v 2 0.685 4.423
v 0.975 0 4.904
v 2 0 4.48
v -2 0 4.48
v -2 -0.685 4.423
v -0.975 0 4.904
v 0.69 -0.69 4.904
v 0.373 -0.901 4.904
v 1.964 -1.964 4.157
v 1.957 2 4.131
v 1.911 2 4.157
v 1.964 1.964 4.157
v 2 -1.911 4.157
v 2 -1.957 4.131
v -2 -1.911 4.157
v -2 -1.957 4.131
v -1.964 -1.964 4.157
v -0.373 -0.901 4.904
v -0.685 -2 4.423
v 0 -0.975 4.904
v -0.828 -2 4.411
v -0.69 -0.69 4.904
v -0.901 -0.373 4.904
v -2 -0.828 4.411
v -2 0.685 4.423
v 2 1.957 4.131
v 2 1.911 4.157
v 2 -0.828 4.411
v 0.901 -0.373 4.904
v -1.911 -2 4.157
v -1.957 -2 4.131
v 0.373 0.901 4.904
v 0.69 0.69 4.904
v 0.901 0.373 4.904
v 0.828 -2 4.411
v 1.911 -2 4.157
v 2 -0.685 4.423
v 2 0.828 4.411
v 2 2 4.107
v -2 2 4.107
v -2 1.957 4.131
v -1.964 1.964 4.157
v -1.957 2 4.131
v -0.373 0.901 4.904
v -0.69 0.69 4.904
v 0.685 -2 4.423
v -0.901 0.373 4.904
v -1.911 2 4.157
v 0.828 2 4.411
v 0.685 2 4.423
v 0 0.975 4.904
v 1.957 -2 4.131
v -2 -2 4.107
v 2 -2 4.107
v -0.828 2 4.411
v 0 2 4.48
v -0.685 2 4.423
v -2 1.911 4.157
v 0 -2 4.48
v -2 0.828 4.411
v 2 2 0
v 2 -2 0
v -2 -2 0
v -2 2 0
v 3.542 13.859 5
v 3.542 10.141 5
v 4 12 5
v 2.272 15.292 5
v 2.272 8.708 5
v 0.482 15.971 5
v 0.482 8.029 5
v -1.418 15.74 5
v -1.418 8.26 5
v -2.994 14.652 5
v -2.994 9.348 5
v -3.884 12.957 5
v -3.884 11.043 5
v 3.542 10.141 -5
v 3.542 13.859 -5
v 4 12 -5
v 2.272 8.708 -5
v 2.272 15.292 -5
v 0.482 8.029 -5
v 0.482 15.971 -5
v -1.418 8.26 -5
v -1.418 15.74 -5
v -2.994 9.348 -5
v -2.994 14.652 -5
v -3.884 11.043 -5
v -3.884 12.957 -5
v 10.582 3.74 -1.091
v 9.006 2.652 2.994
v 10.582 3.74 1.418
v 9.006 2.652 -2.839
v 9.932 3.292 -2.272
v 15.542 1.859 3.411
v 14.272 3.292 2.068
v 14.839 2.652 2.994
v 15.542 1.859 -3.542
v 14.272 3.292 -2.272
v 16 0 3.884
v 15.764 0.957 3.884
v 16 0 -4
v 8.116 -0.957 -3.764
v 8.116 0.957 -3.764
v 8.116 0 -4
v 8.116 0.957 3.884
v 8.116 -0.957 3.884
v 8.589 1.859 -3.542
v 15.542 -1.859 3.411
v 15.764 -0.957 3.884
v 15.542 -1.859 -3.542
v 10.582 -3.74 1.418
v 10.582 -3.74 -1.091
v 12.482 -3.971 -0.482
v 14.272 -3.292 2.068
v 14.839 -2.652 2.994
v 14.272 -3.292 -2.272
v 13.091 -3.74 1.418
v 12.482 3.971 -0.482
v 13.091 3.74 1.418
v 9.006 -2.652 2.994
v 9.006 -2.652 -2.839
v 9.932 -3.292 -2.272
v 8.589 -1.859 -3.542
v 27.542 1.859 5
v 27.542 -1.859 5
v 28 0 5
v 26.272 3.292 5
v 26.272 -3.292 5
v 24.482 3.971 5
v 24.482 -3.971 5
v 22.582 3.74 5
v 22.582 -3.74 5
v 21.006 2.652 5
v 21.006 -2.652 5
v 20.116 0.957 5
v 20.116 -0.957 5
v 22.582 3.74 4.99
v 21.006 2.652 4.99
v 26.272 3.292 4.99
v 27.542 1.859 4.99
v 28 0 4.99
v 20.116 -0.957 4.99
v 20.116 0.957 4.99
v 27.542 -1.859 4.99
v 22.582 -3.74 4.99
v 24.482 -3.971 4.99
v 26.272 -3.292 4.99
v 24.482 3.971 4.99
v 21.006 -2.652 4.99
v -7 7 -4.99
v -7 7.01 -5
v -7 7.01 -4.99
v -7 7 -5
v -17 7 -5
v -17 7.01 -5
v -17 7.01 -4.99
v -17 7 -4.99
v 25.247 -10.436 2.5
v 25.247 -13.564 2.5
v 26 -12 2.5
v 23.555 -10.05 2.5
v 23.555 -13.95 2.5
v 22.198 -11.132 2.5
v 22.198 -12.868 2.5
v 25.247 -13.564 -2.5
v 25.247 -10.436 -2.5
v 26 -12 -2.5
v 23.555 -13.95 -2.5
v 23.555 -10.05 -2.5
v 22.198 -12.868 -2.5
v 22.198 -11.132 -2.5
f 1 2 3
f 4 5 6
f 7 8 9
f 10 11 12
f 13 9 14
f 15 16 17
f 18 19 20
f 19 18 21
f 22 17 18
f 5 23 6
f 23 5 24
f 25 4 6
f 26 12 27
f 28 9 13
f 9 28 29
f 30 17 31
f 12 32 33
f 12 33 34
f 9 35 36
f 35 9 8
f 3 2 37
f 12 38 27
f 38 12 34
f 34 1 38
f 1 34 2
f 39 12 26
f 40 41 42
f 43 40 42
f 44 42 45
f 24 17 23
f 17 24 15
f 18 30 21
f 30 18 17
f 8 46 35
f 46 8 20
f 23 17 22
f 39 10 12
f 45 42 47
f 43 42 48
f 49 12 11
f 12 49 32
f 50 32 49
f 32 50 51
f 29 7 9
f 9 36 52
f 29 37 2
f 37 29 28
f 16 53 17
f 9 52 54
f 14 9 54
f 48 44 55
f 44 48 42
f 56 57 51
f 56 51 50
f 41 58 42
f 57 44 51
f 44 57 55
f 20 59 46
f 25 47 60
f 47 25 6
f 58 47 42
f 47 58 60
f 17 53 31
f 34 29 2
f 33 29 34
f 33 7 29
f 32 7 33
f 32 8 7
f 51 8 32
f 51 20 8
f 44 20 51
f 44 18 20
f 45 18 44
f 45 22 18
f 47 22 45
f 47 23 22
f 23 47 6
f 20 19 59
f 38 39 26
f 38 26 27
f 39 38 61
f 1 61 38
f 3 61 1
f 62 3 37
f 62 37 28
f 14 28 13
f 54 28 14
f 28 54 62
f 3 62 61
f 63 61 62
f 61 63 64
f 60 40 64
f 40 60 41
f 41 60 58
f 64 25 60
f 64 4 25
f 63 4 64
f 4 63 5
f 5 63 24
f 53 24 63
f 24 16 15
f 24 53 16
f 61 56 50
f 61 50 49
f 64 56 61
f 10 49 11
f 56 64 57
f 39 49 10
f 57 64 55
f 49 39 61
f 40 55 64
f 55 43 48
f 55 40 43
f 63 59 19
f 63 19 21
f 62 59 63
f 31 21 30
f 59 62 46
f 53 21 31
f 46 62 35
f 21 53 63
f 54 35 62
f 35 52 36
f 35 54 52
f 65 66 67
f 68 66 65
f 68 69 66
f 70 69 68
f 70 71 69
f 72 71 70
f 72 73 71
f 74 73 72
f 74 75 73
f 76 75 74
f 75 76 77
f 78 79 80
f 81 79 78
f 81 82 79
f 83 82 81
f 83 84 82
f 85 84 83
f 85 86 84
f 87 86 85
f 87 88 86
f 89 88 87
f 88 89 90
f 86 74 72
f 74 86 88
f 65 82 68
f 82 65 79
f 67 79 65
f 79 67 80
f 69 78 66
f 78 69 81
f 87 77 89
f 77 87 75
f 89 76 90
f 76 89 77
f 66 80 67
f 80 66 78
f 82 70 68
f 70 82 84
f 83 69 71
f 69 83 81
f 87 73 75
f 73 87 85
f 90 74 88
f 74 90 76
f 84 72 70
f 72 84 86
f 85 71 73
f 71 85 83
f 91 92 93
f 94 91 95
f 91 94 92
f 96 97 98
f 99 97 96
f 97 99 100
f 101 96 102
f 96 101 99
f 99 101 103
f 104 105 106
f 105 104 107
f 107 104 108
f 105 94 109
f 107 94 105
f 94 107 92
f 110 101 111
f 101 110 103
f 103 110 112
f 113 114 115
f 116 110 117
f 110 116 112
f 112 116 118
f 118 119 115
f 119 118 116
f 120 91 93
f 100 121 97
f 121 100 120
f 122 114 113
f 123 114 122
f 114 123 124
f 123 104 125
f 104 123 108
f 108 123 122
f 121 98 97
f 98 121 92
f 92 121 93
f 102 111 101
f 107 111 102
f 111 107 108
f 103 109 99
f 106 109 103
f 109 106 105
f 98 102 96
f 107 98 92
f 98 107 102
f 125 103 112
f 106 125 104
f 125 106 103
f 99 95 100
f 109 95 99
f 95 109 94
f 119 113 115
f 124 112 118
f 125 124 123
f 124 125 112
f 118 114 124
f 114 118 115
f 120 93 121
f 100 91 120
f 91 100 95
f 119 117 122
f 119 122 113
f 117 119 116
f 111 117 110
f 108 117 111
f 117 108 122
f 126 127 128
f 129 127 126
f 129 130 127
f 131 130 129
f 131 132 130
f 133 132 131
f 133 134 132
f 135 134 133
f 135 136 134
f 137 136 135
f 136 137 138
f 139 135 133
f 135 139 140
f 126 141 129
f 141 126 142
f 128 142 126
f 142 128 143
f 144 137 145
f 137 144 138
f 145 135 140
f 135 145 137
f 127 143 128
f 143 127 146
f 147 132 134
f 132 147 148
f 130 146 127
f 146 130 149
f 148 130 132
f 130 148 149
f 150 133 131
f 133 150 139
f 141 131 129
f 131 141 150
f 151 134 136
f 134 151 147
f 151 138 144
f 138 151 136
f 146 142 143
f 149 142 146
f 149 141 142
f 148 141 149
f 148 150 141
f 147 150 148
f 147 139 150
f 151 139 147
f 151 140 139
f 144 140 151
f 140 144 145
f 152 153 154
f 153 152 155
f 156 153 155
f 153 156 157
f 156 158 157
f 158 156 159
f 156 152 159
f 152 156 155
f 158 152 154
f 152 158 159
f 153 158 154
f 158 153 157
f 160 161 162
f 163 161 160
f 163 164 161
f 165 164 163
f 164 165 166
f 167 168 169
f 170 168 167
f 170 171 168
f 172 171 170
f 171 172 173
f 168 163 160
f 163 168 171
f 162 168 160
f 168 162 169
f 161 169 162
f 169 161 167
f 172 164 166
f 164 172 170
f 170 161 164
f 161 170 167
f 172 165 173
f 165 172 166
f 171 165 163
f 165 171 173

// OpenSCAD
// Empty
intersection();

// No children
intersection() { }

intersection() {
  sphere(r=5);
  translate([0,0,3]) cube([4,4,6], center=true);
}

translate([0,12,0]) intersection() {
  cube([10,10,10], center=true);
  cylinder(r=4, h=12, center=true);
}

translate([12,0,0]) intersection() {
  cube([10,10,10], center=true);
  cylinder(r=4, h=12, center=true);
  rotate([0,90,0]) cylinder(r=4, h=12, center=true);
}

translate([12,12,0]) intersection() {
  cube([10,10,10], center=true);
  translate([0,0,7.01]) cylinder(r=4, h=4, center=true);
}

translate([24,0,0]) intersection() {
  cube([10,10,10], center=true);
  translate([0,0,6.99]) cylinder(r=4, h=4, center=true);
}

translate([-12,0,0]) intersection() {
  cube([10,10,10], center=true);
  translate([0,-10,-10]) cube([10,10,10], center=true);
}

translate([-12,12,0]) intersection() {
  cube([10,10,10], center=true);
  translate([0,-9.99,-9.99]) cube([10,10,10], center=true);
}

// Intersecting something with nothing
translate([0,-12,0]) intersection() {
  cylinder(r=4, h=5, center=true);
  cube(0);
}

// Intersecting something with nothing (issue 996)
translate([0,-12,0]) intersection() {
  cube(4, center=true);
  linear_extrude();
}
translate([0,-16,0]) intersection() {
  cube(4, center=true);
  render();
}
translate([0,-20,0]) intersection() {
  cube(4, center=true);
  minkowski();
}

// Intersecting 2D with 3D
translate([12,-12,0]) intersection() {
  cube([5,5,5], center=true);
  circle(r=2);
}

// Non-geometry (echo) statement as first child should be ignored
translate([24,-12,0]) intersection() {
  echo("difference-tests");
  cube([5,5,5], center=true);
  cylinder(r=2, h=20, center=true);
}
